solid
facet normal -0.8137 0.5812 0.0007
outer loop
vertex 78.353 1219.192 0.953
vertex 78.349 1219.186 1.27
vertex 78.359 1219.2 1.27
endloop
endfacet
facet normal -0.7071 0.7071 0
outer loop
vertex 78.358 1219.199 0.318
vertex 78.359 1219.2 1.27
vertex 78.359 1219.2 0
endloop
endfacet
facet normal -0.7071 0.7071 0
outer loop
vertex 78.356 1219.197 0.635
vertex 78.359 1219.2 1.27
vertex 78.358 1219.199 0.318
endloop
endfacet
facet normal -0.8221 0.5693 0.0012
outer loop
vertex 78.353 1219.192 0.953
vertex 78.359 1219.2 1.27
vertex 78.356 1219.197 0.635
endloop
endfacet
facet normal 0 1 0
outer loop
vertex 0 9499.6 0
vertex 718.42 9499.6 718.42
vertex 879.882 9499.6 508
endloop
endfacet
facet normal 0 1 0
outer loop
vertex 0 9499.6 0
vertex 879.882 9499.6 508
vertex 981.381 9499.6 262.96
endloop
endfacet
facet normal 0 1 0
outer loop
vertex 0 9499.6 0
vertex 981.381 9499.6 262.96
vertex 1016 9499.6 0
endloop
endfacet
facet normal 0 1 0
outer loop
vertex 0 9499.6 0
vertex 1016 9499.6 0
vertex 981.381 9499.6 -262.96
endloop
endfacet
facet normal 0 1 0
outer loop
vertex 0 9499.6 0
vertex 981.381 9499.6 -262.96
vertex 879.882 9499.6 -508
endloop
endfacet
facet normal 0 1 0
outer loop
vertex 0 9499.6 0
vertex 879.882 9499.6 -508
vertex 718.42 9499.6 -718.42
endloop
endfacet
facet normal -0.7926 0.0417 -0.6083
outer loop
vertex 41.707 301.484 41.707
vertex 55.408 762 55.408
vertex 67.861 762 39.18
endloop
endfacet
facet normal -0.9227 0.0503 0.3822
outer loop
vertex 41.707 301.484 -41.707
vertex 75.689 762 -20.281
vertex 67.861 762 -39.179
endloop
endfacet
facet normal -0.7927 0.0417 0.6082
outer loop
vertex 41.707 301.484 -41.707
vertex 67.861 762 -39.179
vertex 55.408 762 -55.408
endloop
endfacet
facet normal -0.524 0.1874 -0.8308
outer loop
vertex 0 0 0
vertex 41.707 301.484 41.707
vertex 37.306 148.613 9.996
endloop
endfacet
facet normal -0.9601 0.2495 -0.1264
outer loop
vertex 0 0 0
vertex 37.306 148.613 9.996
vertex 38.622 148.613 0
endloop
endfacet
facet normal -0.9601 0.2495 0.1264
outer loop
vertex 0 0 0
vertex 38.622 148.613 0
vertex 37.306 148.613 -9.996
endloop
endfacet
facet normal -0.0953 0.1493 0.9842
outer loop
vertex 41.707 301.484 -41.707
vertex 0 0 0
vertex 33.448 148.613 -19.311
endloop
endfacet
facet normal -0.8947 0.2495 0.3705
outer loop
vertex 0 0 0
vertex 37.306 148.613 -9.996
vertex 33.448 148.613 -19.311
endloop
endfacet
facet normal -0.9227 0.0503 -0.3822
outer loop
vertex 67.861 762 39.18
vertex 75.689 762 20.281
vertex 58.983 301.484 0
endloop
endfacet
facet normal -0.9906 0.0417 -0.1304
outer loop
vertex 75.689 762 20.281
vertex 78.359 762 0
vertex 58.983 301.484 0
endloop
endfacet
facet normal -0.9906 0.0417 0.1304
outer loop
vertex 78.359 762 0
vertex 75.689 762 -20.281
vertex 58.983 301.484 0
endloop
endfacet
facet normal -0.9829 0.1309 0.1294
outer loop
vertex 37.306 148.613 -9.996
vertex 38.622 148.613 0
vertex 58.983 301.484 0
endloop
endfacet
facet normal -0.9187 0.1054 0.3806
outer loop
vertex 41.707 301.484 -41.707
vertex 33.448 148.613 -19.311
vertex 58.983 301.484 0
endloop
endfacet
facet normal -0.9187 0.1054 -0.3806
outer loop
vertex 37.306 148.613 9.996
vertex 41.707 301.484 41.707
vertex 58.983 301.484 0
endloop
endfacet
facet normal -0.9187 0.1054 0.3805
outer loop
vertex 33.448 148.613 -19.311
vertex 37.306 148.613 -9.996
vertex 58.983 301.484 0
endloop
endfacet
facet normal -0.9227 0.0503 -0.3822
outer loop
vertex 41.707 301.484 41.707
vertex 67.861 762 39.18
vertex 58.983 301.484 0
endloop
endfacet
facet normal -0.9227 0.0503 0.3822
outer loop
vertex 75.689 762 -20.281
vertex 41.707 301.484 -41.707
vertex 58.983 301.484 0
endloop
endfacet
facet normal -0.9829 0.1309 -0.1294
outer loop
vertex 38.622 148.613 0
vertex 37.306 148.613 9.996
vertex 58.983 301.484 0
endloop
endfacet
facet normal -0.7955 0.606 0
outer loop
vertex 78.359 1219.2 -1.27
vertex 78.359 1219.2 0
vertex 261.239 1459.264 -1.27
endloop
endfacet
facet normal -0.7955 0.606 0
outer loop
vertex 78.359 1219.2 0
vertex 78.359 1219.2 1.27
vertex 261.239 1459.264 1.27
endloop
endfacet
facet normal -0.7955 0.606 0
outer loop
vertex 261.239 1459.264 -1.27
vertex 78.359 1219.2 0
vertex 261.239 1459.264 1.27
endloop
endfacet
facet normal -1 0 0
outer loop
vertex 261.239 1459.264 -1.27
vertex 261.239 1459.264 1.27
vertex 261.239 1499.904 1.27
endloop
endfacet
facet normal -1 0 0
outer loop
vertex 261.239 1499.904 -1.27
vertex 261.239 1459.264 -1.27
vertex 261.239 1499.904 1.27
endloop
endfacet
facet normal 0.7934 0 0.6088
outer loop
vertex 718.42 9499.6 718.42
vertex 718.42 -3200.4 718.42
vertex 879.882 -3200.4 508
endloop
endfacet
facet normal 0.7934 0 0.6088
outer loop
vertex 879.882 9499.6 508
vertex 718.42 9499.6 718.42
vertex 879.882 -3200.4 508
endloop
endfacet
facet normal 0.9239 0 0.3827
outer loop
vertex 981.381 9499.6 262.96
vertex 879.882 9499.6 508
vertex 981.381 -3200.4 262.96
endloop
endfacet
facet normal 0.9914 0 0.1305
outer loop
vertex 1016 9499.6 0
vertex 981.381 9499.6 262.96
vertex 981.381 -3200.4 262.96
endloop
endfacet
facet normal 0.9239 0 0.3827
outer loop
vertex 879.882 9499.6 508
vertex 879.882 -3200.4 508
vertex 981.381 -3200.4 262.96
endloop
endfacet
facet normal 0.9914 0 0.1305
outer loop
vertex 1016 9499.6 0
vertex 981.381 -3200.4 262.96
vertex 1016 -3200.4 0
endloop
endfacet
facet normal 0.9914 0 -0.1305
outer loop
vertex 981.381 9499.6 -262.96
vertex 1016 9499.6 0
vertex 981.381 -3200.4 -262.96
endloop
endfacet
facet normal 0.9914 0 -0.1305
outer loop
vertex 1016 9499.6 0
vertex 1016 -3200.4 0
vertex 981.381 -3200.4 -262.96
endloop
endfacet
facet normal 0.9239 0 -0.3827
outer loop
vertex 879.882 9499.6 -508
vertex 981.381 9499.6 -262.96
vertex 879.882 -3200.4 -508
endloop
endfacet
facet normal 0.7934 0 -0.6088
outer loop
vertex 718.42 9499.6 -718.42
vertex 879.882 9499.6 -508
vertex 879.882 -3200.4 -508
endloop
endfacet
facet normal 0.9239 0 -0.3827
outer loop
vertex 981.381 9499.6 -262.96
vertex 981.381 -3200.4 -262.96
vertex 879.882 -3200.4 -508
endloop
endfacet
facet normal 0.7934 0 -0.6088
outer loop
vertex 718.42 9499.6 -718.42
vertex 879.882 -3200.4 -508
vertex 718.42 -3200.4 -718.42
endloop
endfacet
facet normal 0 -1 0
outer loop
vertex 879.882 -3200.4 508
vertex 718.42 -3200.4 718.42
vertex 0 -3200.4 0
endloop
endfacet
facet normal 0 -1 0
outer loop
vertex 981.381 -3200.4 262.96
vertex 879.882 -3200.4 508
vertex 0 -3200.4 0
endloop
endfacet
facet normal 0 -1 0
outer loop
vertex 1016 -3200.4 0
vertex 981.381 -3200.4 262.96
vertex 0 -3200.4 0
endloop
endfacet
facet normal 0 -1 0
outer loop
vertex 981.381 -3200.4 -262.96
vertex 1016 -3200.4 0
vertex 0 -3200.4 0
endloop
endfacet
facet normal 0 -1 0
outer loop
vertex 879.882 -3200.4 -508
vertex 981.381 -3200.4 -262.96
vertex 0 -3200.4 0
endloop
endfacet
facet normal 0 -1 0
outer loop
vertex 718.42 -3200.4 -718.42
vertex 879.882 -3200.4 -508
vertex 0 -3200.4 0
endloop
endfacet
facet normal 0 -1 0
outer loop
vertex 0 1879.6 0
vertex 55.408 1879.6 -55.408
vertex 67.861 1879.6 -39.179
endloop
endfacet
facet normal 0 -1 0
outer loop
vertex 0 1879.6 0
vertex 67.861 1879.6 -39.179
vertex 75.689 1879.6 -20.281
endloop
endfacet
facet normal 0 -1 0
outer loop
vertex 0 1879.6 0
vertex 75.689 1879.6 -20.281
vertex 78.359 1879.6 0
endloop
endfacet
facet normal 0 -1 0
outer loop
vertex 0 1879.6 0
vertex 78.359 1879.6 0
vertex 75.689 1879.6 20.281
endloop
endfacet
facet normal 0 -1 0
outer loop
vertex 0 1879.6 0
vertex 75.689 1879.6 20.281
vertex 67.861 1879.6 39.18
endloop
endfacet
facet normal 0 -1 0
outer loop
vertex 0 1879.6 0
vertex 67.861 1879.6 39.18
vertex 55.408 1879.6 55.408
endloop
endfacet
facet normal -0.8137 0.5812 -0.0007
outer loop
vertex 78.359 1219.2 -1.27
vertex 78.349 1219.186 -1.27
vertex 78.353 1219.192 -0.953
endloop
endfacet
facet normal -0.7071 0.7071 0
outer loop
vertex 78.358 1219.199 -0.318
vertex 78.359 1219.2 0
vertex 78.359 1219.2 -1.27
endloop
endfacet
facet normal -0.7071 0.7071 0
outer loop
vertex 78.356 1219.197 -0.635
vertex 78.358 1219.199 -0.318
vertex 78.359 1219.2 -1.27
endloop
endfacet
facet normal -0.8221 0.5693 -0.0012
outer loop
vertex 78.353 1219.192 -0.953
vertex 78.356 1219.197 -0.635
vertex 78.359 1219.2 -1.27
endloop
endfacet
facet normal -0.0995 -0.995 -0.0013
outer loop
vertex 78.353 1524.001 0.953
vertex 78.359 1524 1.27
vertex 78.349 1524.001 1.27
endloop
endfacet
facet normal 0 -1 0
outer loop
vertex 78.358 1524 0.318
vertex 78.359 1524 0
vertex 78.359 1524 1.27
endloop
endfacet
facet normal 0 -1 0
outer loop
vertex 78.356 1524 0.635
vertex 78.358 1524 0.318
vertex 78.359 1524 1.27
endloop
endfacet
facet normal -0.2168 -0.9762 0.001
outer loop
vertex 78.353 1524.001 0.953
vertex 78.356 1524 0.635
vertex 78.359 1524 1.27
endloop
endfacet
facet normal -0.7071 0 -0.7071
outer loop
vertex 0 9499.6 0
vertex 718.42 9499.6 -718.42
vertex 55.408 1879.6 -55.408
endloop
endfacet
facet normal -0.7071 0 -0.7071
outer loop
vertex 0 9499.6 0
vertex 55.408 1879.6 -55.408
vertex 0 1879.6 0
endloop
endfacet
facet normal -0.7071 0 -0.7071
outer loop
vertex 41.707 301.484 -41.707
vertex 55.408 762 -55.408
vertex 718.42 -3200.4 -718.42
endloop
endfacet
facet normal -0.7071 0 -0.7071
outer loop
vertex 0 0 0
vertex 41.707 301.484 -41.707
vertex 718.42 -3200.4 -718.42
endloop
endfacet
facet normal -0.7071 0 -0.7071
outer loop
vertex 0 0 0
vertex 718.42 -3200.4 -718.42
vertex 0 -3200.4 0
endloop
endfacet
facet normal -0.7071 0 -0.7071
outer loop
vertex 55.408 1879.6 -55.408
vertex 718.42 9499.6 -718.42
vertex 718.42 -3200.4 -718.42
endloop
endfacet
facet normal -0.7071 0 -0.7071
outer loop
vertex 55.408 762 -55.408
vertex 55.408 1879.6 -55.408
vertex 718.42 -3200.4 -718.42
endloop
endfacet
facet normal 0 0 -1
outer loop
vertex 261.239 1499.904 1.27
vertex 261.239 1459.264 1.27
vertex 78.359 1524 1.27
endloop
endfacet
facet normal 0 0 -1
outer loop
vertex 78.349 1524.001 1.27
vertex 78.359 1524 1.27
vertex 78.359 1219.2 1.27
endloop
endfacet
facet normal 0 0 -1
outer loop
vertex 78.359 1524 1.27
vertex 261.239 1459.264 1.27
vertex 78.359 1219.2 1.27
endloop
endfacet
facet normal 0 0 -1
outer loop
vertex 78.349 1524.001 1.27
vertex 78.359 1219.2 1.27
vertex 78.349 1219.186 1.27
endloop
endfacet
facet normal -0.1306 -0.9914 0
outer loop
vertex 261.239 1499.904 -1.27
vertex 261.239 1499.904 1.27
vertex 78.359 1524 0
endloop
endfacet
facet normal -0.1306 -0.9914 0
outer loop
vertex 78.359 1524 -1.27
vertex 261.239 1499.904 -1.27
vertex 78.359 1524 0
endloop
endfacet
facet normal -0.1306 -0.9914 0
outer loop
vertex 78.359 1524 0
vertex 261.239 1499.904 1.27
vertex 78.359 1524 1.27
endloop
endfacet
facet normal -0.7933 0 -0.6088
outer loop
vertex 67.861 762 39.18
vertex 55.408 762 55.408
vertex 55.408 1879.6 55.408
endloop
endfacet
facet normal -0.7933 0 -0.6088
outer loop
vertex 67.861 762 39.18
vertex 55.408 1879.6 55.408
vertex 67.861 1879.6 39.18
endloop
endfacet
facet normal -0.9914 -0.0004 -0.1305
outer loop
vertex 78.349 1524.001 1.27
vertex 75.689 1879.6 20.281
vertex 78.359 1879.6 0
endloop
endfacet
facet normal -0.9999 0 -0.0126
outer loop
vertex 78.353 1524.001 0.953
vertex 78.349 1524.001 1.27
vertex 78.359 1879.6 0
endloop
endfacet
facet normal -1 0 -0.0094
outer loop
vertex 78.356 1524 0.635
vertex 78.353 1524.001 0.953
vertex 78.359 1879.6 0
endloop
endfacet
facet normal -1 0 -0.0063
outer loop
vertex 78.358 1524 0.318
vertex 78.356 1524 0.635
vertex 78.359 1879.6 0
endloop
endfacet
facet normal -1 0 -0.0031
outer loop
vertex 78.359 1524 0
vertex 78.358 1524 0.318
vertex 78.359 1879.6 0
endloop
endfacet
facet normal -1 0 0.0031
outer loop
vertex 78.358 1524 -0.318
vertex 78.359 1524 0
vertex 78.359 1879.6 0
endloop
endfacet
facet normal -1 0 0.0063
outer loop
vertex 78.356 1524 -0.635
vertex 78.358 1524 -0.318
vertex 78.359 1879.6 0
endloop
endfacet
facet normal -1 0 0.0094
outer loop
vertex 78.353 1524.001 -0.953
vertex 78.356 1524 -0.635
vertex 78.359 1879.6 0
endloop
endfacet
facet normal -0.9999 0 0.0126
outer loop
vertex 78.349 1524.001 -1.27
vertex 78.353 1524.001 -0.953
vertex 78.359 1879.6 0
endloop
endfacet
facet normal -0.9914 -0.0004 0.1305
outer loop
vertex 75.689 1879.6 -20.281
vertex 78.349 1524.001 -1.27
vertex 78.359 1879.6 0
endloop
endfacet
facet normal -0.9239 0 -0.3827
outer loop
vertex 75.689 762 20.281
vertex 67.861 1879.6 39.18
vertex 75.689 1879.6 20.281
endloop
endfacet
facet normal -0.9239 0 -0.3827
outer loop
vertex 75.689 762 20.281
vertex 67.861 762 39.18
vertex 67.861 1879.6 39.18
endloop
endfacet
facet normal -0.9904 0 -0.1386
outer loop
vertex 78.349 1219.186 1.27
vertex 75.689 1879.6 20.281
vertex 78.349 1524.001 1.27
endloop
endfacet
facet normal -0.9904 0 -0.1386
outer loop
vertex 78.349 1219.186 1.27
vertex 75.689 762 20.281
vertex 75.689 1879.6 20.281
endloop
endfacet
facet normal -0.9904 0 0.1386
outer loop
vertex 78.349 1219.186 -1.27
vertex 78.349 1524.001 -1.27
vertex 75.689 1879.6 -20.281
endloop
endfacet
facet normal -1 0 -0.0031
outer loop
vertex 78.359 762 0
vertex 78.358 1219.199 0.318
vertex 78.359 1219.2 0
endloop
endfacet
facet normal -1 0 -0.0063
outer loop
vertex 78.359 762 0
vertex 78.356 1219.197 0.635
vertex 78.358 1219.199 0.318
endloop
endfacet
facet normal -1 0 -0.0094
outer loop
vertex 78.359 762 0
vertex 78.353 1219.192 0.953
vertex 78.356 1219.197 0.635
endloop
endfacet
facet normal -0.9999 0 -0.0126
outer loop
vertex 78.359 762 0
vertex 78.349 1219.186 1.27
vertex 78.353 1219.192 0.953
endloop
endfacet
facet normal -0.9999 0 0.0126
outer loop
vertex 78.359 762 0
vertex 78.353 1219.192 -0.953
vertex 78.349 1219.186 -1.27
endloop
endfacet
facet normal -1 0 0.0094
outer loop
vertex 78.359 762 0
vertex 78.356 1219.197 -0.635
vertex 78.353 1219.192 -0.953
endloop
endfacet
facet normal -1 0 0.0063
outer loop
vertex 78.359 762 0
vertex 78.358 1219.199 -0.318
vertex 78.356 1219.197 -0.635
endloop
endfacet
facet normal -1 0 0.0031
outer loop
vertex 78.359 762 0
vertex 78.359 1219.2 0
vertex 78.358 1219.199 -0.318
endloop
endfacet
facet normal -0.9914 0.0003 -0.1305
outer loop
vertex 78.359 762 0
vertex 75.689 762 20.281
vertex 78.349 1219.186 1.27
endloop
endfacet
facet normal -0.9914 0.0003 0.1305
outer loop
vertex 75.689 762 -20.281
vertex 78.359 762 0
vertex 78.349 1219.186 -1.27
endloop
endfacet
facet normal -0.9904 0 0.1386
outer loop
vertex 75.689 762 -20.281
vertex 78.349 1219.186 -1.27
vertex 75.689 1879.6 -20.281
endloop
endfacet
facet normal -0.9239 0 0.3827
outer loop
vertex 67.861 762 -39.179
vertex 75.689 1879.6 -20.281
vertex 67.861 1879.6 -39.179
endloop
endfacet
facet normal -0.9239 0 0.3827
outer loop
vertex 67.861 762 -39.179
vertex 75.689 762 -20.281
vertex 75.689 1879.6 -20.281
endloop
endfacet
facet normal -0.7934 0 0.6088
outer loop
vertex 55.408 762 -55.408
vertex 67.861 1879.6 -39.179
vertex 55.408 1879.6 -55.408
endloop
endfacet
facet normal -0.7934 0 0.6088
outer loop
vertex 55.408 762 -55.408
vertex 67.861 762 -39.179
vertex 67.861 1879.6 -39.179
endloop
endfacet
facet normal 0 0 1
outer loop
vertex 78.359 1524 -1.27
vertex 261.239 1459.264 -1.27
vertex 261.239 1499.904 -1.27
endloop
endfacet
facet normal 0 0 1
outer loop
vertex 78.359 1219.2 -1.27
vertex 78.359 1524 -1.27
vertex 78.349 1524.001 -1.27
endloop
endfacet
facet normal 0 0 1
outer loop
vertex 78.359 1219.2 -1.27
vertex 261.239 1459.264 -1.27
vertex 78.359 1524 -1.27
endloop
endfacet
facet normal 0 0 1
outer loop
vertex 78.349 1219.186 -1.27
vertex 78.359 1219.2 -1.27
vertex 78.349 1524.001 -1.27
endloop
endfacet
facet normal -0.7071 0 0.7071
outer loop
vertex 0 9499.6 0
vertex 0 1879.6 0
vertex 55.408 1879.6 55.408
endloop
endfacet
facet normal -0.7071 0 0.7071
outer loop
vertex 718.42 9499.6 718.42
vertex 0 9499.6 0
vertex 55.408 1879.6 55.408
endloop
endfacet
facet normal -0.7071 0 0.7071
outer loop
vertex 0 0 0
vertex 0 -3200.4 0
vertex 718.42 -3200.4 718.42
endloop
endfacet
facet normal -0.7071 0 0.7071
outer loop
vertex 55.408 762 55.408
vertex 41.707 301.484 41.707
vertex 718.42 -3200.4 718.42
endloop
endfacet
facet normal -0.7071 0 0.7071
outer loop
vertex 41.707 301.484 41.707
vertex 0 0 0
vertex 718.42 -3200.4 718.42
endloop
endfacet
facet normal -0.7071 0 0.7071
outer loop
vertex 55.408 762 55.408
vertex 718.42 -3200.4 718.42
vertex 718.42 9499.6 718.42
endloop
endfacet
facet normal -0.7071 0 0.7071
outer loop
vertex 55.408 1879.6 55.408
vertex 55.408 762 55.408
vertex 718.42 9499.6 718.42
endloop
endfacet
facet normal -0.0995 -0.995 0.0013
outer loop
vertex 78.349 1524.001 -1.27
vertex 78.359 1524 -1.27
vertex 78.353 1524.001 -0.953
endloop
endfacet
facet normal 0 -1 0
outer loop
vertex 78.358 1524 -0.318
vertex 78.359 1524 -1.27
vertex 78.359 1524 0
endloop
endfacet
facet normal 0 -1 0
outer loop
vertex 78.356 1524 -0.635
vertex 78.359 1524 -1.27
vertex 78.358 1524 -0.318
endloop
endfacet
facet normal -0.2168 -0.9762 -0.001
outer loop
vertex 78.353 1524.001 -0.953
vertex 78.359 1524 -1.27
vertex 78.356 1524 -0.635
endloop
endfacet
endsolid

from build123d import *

# Parameters (mm, degrees)
SKETCH5_R                = 78.359
BOSS_EXTRUDE1_DEPTH      = 1117.6
CUT_EXTRUDE2_DEPTH       = 1883.863889443
BOSS_EXTRUDE3_DEPTH      = 1.27
BOSS_EXTRUDE4_DEPTH      = 7620
BOSS_EXTRUDE4_DEPTH_BACK = 5080


with BuildPart() as part:
    # Sketch4 → Revolve1 (revolve)
    with BuildSketch(Plane.YZ):
        with BuildLine():
            add(Edge.make_bspline(
                [(0, 0), (0.002272338, 0.010525317), (0.008561015, 0.031009867), (0.027689705, 0.069756925), (0.061239273, 0.124735634), (0.105324786, 0.185752869), (0.192338612, 0.292743497), (0.322874784, 0.430842392), (0.490263053, 0.587055669), (0.695016601, 0.7598799), (0.912926923, 0.931318831), (1.143240517, 1.10197974), (1.531804995, 1.374749944), (2.242570555, 1.834607161), (3.524849665, 2.579591801), (5.903846922, 3.797737268), (10.150615363, 5.693703914), (17.478480432, 8.523516836), (29.870634739, 12.646347877), (49.775460189, 18.3187623), (79.425215434, 25.51448835), (117.543255539, 33.338604399), (161.899434584, 41.077041953), (209.528749396, 48.168105347), (257.293142226, 54.274216652), (305.158994976, 59.520897511), (353.102640037, 63.996513764), (401.106648045, 67.766524351), (449.157215103, 70.883868143), (497.243146494, 73.39332762), (545.355125756, 75.337001384), (593.485273111, 76.756141879), (641.626977986, 77.698006858), (689.774868279, 78.216958862), (725.887462179, 78.34877941), (749.962507453, 78.359), (762, 78.359)],
                knots=[0, 0, 0, 0, 0, 5.5813e-05, 0.000111625, 0.000223251, 0.000334876, 0.000446501, 0.000828139, 0.001209777, 0.001524204, 0.001838631, 0.002269008, 0.002699385, 0.003991346, 0.006237054, 0.009973045, 0.016584104, 0.028152194, 0.047047102, 0.077827284, 0.124123811, 0.186686459, 0.249249025, 0.311811664, 0.374374313, 0.43693692, 0.499499542, 0.562062142, 0.624624763, 0.687187327, 0.749749772, 0.812312453, 0.874875111, 0.937437709, 1, 1, 1, 1, 1], degree=4))
            Line((0, 0), (762, 0))
            Line((762, 0), (762, 78.359))
        make_face()
    revolve(axis=Axis((0, 0, 0), (0, 1, 0)))

    # Sketch5 → Boss-Extrude1 (add)
    with BuildSketch(Plane(origin=(0, 762, 0), x_dir=(-1, 0, 0), z_dir=(0, 1, 0))):
        Circle(SKETCH5_R)
    extrude(amount=BOSS_EXTRUDE1_DEPTH)

    # Sketch10 → Cut-Extrude2 (cut, through all)
    with BuildSketch(Plane(origin=(0, 1879.6, 0), x_dir=(-1, 0, 0), z_dir=(0, 1, 0))):
        with BuildLine():
            Line((-55.408180267, 55.408180267), (0, 0))
            Line((0, 0), (-55.408180267, -55.408180267))
            ThreePointArc((-55.408180267, -55.408180267), (78.359, 0), (-55.408180267, 55.408180267))
        make_face()
    extrude(amount=-CUT_EXTRUDE2_DEPTH, mode=Mode.SUBTRACT)

    # Sketch14 → Boss-Extrude3 (add, symmetric)
    with BuildSketch(Plane(origin=(0, 0, 0), x_dir=(-1, 0, 0), z_dir=(0, 0, 1))):
        Polygon((-55.408180267, -1189.07274269), (-261.239, -1459.264314952), (-261.239, -1499.904314952), (-55.408180267, -1527.023926749), (-55.408180267, -1524), (-52.959, -1524), (-52.959, -1219.2), (-55.408180267, -1219.2), align=None)
    extrude(amount=BOSS_EXTRUDE3_DEPTH, both=True)


with BuildPart() as body_2:
    # Sketch15 → Boss-Extrude4 (new, two sides: drawn at the far end of the back side and taken through both)
    with BuildSketch(Plane(origin=(0, 1879.6, 0), x_dir=(-1, 0, 0), z_dir=(0, 1, 0)).offset(-BOSS_EXTRUDE4_DEPTH_BACK)):
        with BuildLine():
            Line((0, 0), (-718.420489686, 718.420489686))
            ThreePointArc((-718.420489686, 718.420489686), (-1016, 0), (-718.420489686, -718.420489686))
            Line((-718.420489686, -718.420489686), (0, 0))
        make_face()
    extrude(amount=BOSS_EXTRUDE4_DEPTH + BOSS_EXTRUDE4_DEPTH_BACK)

    # Combine1: cut part
    add(part.part, mode=Mode.SUBTRACT)


solid = body_2.part
